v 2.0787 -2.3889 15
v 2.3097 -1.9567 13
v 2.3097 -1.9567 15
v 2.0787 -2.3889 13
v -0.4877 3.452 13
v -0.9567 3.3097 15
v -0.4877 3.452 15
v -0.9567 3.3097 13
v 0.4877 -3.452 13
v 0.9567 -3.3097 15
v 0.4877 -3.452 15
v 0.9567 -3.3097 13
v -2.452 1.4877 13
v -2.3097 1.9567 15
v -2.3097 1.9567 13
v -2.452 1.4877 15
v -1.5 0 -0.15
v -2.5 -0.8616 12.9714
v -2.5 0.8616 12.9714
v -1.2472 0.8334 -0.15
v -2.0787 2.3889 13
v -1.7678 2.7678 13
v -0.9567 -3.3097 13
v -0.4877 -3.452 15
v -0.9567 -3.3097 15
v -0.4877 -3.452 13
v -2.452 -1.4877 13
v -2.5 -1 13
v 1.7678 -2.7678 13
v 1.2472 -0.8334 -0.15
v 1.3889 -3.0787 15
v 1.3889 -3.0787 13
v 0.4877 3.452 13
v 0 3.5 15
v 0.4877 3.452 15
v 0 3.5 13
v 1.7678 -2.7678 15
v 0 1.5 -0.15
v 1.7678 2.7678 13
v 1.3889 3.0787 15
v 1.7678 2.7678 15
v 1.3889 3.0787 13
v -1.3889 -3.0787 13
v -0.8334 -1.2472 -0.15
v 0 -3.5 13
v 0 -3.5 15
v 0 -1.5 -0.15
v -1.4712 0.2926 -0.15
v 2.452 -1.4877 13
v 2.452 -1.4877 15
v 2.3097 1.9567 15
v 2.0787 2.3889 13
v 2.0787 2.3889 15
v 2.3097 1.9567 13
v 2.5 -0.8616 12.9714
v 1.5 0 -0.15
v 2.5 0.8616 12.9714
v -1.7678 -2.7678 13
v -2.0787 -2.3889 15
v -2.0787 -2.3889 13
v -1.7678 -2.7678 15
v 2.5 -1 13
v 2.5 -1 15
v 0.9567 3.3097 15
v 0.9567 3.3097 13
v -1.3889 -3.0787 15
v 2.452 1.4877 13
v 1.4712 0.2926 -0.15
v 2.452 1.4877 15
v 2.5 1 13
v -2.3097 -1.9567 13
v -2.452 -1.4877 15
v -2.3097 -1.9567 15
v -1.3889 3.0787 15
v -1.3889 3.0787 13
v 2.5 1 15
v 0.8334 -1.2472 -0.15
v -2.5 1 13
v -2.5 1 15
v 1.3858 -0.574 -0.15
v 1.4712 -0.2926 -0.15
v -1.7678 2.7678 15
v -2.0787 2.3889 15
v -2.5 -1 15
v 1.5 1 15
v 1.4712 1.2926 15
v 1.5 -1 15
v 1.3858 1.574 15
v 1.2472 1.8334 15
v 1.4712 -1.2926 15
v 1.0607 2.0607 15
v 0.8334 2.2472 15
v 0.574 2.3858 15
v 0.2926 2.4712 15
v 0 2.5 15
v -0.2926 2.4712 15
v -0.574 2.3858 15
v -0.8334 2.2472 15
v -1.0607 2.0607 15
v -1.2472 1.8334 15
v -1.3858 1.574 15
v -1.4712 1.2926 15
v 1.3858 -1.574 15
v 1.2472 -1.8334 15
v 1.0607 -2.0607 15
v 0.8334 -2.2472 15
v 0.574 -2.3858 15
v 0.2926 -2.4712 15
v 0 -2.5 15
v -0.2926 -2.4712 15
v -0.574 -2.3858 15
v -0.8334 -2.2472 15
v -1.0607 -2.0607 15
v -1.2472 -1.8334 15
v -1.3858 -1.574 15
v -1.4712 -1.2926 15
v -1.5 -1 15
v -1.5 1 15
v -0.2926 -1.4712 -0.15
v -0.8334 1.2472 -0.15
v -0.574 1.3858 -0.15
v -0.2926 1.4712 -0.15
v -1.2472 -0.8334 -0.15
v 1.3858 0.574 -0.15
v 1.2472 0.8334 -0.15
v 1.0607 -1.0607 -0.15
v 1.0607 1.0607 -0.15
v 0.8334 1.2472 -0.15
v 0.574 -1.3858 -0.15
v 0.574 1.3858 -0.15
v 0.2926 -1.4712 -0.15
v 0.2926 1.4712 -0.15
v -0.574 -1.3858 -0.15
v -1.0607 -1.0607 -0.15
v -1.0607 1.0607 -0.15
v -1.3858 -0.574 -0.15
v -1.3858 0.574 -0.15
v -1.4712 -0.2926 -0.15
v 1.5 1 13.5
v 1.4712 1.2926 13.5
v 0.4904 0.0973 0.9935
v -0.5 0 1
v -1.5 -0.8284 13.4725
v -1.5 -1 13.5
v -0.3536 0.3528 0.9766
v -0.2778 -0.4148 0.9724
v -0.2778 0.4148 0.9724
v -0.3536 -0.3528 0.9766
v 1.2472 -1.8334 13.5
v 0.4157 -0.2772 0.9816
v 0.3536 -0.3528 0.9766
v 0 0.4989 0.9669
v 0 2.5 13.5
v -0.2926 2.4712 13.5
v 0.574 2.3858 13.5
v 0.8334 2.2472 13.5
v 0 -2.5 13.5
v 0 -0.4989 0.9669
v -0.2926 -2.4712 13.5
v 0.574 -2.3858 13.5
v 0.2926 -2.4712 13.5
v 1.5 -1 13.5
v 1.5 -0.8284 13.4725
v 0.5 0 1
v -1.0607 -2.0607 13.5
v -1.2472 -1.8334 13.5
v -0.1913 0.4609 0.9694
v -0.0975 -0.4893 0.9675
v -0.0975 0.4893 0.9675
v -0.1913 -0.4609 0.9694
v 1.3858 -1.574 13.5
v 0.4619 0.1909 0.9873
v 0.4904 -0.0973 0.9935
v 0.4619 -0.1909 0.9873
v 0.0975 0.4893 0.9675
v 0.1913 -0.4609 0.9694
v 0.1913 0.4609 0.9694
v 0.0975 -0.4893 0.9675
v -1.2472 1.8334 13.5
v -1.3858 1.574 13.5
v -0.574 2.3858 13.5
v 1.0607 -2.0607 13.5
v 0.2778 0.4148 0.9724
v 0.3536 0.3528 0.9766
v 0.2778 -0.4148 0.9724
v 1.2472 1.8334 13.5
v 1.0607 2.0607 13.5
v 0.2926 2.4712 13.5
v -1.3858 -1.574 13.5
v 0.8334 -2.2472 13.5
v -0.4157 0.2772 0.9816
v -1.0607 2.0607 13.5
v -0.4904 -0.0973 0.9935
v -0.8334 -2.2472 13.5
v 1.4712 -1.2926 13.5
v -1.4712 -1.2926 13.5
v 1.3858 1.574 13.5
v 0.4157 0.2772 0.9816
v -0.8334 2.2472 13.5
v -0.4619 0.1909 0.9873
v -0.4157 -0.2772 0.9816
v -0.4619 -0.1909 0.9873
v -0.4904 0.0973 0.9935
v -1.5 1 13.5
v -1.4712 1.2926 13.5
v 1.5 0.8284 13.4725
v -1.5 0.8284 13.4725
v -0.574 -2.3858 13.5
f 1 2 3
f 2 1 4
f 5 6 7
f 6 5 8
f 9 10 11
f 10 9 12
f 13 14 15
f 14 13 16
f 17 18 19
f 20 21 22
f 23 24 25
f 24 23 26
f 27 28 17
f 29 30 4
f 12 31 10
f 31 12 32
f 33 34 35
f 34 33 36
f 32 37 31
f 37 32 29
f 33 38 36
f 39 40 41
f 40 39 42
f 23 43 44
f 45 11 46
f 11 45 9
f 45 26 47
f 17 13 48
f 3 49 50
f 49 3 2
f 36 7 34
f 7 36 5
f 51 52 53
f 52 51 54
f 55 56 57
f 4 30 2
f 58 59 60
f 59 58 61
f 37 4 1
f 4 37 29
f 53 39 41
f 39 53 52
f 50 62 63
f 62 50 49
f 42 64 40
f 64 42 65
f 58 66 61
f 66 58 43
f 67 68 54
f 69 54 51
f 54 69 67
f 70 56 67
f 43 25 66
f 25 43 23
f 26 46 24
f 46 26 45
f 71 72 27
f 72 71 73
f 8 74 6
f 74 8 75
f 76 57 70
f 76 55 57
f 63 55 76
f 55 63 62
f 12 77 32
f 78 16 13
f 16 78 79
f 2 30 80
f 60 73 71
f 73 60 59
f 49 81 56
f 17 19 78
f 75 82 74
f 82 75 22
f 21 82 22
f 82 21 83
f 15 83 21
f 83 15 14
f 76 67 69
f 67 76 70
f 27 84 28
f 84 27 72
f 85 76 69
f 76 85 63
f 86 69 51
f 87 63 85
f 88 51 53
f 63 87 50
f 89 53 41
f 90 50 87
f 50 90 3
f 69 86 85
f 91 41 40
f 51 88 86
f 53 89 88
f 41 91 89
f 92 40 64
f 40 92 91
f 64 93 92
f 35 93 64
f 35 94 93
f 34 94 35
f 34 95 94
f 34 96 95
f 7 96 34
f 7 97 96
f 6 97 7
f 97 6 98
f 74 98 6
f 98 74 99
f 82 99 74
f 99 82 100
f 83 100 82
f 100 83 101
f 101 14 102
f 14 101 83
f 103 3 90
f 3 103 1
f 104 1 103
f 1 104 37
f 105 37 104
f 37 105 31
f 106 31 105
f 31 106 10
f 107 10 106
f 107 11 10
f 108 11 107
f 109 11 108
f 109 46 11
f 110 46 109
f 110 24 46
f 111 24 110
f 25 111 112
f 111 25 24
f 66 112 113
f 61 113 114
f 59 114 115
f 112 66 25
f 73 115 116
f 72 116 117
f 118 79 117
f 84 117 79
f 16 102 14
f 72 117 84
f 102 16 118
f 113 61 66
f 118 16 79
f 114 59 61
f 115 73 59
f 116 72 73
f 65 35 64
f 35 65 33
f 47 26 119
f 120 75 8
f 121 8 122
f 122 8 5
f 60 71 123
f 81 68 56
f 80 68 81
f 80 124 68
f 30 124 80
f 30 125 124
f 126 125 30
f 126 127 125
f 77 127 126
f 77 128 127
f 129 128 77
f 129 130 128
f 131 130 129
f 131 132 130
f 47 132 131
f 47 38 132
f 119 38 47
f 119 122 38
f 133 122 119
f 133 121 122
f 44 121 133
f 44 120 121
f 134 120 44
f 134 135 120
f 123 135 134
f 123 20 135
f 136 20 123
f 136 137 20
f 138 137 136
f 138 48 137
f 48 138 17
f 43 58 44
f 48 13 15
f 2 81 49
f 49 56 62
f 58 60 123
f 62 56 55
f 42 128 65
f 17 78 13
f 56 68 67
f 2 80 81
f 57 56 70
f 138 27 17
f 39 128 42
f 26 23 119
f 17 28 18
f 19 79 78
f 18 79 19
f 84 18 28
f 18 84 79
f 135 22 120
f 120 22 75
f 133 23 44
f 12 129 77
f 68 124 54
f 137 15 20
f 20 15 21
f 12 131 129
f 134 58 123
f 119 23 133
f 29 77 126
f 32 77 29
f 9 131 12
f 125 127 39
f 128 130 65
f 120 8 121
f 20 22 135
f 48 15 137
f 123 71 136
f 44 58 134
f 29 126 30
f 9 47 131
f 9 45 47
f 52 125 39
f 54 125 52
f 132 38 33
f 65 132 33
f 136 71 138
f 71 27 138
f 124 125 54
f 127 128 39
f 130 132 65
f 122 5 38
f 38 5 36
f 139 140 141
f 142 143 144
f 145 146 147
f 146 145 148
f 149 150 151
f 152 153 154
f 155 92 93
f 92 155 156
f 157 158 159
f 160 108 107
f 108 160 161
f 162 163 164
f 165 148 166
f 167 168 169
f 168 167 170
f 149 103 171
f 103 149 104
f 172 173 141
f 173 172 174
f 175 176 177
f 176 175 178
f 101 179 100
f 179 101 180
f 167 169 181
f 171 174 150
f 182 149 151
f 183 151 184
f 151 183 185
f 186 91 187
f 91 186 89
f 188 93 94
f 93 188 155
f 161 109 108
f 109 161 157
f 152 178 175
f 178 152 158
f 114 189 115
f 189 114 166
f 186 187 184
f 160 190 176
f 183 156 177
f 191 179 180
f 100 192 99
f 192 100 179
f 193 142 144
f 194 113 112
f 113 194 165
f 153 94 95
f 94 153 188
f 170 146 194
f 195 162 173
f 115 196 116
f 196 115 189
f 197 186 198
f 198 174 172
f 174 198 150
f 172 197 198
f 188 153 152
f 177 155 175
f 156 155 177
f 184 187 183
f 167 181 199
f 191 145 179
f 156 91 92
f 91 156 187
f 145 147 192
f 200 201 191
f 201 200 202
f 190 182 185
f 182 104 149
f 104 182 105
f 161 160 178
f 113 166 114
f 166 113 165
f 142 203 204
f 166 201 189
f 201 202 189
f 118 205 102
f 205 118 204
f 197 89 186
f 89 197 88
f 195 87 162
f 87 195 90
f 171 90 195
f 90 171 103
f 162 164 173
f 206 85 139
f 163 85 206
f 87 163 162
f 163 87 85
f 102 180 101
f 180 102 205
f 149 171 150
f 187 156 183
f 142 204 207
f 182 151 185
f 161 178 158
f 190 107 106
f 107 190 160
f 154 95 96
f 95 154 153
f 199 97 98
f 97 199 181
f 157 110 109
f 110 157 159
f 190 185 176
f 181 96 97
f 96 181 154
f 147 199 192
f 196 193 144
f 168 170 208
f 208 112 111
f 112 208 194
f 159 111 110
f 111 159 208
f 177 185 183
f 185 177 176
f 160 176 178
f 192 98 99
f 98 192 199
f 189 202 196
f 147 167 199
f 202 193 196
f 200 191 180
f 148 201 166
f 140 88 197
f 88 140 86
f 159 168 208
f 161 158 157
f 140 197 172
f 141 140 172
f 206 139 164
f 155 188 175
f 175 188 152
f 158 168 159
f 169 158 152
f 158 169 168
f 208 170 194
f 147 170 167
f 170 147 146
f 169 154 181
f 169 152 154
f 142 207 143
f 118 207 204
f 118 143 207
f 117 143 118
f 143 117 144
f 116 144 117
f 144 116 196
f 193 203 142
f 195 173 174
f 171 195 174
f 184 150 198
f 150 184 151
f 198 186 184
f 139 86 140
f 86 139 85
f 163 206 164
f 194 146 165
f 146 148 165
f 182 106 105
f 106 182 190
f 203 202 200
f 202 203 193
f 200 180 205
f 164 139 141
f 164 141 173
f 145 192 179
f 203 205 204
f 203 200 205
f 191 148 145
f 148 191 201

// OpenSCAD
$fn=32;

a=3.8;

difference() {

hull() {
  translate([0,0,-0.15]) cylinder(r=1.5,h=1);
  rotate([-a,0,0]) cylinder(r1=1.5,r2=2.5,h=13);
  rotate([a,0,0]) cylinder(r1=1.5,r2=2.5,h=13);
  translate([0,1,13]) cylinder(r=2.5,h=2);
  translate([0,-1,13]) cylinder(r=2.5,h=2);

}

translate([0,0,1]) hull() {
  rotate([-a,0,0]) cylinder(r1=0.5,r2=1.5,h=12.5);
  rotate([a,0,0]) cylinder(r1=0.5,r2=1.5,h=12.5);
  translate([0,1,12.5]) cylinder(r=1.5,h=2);
  translate([0,-1,12.5]) cylinder(r=1.5,h=2);
}

}
